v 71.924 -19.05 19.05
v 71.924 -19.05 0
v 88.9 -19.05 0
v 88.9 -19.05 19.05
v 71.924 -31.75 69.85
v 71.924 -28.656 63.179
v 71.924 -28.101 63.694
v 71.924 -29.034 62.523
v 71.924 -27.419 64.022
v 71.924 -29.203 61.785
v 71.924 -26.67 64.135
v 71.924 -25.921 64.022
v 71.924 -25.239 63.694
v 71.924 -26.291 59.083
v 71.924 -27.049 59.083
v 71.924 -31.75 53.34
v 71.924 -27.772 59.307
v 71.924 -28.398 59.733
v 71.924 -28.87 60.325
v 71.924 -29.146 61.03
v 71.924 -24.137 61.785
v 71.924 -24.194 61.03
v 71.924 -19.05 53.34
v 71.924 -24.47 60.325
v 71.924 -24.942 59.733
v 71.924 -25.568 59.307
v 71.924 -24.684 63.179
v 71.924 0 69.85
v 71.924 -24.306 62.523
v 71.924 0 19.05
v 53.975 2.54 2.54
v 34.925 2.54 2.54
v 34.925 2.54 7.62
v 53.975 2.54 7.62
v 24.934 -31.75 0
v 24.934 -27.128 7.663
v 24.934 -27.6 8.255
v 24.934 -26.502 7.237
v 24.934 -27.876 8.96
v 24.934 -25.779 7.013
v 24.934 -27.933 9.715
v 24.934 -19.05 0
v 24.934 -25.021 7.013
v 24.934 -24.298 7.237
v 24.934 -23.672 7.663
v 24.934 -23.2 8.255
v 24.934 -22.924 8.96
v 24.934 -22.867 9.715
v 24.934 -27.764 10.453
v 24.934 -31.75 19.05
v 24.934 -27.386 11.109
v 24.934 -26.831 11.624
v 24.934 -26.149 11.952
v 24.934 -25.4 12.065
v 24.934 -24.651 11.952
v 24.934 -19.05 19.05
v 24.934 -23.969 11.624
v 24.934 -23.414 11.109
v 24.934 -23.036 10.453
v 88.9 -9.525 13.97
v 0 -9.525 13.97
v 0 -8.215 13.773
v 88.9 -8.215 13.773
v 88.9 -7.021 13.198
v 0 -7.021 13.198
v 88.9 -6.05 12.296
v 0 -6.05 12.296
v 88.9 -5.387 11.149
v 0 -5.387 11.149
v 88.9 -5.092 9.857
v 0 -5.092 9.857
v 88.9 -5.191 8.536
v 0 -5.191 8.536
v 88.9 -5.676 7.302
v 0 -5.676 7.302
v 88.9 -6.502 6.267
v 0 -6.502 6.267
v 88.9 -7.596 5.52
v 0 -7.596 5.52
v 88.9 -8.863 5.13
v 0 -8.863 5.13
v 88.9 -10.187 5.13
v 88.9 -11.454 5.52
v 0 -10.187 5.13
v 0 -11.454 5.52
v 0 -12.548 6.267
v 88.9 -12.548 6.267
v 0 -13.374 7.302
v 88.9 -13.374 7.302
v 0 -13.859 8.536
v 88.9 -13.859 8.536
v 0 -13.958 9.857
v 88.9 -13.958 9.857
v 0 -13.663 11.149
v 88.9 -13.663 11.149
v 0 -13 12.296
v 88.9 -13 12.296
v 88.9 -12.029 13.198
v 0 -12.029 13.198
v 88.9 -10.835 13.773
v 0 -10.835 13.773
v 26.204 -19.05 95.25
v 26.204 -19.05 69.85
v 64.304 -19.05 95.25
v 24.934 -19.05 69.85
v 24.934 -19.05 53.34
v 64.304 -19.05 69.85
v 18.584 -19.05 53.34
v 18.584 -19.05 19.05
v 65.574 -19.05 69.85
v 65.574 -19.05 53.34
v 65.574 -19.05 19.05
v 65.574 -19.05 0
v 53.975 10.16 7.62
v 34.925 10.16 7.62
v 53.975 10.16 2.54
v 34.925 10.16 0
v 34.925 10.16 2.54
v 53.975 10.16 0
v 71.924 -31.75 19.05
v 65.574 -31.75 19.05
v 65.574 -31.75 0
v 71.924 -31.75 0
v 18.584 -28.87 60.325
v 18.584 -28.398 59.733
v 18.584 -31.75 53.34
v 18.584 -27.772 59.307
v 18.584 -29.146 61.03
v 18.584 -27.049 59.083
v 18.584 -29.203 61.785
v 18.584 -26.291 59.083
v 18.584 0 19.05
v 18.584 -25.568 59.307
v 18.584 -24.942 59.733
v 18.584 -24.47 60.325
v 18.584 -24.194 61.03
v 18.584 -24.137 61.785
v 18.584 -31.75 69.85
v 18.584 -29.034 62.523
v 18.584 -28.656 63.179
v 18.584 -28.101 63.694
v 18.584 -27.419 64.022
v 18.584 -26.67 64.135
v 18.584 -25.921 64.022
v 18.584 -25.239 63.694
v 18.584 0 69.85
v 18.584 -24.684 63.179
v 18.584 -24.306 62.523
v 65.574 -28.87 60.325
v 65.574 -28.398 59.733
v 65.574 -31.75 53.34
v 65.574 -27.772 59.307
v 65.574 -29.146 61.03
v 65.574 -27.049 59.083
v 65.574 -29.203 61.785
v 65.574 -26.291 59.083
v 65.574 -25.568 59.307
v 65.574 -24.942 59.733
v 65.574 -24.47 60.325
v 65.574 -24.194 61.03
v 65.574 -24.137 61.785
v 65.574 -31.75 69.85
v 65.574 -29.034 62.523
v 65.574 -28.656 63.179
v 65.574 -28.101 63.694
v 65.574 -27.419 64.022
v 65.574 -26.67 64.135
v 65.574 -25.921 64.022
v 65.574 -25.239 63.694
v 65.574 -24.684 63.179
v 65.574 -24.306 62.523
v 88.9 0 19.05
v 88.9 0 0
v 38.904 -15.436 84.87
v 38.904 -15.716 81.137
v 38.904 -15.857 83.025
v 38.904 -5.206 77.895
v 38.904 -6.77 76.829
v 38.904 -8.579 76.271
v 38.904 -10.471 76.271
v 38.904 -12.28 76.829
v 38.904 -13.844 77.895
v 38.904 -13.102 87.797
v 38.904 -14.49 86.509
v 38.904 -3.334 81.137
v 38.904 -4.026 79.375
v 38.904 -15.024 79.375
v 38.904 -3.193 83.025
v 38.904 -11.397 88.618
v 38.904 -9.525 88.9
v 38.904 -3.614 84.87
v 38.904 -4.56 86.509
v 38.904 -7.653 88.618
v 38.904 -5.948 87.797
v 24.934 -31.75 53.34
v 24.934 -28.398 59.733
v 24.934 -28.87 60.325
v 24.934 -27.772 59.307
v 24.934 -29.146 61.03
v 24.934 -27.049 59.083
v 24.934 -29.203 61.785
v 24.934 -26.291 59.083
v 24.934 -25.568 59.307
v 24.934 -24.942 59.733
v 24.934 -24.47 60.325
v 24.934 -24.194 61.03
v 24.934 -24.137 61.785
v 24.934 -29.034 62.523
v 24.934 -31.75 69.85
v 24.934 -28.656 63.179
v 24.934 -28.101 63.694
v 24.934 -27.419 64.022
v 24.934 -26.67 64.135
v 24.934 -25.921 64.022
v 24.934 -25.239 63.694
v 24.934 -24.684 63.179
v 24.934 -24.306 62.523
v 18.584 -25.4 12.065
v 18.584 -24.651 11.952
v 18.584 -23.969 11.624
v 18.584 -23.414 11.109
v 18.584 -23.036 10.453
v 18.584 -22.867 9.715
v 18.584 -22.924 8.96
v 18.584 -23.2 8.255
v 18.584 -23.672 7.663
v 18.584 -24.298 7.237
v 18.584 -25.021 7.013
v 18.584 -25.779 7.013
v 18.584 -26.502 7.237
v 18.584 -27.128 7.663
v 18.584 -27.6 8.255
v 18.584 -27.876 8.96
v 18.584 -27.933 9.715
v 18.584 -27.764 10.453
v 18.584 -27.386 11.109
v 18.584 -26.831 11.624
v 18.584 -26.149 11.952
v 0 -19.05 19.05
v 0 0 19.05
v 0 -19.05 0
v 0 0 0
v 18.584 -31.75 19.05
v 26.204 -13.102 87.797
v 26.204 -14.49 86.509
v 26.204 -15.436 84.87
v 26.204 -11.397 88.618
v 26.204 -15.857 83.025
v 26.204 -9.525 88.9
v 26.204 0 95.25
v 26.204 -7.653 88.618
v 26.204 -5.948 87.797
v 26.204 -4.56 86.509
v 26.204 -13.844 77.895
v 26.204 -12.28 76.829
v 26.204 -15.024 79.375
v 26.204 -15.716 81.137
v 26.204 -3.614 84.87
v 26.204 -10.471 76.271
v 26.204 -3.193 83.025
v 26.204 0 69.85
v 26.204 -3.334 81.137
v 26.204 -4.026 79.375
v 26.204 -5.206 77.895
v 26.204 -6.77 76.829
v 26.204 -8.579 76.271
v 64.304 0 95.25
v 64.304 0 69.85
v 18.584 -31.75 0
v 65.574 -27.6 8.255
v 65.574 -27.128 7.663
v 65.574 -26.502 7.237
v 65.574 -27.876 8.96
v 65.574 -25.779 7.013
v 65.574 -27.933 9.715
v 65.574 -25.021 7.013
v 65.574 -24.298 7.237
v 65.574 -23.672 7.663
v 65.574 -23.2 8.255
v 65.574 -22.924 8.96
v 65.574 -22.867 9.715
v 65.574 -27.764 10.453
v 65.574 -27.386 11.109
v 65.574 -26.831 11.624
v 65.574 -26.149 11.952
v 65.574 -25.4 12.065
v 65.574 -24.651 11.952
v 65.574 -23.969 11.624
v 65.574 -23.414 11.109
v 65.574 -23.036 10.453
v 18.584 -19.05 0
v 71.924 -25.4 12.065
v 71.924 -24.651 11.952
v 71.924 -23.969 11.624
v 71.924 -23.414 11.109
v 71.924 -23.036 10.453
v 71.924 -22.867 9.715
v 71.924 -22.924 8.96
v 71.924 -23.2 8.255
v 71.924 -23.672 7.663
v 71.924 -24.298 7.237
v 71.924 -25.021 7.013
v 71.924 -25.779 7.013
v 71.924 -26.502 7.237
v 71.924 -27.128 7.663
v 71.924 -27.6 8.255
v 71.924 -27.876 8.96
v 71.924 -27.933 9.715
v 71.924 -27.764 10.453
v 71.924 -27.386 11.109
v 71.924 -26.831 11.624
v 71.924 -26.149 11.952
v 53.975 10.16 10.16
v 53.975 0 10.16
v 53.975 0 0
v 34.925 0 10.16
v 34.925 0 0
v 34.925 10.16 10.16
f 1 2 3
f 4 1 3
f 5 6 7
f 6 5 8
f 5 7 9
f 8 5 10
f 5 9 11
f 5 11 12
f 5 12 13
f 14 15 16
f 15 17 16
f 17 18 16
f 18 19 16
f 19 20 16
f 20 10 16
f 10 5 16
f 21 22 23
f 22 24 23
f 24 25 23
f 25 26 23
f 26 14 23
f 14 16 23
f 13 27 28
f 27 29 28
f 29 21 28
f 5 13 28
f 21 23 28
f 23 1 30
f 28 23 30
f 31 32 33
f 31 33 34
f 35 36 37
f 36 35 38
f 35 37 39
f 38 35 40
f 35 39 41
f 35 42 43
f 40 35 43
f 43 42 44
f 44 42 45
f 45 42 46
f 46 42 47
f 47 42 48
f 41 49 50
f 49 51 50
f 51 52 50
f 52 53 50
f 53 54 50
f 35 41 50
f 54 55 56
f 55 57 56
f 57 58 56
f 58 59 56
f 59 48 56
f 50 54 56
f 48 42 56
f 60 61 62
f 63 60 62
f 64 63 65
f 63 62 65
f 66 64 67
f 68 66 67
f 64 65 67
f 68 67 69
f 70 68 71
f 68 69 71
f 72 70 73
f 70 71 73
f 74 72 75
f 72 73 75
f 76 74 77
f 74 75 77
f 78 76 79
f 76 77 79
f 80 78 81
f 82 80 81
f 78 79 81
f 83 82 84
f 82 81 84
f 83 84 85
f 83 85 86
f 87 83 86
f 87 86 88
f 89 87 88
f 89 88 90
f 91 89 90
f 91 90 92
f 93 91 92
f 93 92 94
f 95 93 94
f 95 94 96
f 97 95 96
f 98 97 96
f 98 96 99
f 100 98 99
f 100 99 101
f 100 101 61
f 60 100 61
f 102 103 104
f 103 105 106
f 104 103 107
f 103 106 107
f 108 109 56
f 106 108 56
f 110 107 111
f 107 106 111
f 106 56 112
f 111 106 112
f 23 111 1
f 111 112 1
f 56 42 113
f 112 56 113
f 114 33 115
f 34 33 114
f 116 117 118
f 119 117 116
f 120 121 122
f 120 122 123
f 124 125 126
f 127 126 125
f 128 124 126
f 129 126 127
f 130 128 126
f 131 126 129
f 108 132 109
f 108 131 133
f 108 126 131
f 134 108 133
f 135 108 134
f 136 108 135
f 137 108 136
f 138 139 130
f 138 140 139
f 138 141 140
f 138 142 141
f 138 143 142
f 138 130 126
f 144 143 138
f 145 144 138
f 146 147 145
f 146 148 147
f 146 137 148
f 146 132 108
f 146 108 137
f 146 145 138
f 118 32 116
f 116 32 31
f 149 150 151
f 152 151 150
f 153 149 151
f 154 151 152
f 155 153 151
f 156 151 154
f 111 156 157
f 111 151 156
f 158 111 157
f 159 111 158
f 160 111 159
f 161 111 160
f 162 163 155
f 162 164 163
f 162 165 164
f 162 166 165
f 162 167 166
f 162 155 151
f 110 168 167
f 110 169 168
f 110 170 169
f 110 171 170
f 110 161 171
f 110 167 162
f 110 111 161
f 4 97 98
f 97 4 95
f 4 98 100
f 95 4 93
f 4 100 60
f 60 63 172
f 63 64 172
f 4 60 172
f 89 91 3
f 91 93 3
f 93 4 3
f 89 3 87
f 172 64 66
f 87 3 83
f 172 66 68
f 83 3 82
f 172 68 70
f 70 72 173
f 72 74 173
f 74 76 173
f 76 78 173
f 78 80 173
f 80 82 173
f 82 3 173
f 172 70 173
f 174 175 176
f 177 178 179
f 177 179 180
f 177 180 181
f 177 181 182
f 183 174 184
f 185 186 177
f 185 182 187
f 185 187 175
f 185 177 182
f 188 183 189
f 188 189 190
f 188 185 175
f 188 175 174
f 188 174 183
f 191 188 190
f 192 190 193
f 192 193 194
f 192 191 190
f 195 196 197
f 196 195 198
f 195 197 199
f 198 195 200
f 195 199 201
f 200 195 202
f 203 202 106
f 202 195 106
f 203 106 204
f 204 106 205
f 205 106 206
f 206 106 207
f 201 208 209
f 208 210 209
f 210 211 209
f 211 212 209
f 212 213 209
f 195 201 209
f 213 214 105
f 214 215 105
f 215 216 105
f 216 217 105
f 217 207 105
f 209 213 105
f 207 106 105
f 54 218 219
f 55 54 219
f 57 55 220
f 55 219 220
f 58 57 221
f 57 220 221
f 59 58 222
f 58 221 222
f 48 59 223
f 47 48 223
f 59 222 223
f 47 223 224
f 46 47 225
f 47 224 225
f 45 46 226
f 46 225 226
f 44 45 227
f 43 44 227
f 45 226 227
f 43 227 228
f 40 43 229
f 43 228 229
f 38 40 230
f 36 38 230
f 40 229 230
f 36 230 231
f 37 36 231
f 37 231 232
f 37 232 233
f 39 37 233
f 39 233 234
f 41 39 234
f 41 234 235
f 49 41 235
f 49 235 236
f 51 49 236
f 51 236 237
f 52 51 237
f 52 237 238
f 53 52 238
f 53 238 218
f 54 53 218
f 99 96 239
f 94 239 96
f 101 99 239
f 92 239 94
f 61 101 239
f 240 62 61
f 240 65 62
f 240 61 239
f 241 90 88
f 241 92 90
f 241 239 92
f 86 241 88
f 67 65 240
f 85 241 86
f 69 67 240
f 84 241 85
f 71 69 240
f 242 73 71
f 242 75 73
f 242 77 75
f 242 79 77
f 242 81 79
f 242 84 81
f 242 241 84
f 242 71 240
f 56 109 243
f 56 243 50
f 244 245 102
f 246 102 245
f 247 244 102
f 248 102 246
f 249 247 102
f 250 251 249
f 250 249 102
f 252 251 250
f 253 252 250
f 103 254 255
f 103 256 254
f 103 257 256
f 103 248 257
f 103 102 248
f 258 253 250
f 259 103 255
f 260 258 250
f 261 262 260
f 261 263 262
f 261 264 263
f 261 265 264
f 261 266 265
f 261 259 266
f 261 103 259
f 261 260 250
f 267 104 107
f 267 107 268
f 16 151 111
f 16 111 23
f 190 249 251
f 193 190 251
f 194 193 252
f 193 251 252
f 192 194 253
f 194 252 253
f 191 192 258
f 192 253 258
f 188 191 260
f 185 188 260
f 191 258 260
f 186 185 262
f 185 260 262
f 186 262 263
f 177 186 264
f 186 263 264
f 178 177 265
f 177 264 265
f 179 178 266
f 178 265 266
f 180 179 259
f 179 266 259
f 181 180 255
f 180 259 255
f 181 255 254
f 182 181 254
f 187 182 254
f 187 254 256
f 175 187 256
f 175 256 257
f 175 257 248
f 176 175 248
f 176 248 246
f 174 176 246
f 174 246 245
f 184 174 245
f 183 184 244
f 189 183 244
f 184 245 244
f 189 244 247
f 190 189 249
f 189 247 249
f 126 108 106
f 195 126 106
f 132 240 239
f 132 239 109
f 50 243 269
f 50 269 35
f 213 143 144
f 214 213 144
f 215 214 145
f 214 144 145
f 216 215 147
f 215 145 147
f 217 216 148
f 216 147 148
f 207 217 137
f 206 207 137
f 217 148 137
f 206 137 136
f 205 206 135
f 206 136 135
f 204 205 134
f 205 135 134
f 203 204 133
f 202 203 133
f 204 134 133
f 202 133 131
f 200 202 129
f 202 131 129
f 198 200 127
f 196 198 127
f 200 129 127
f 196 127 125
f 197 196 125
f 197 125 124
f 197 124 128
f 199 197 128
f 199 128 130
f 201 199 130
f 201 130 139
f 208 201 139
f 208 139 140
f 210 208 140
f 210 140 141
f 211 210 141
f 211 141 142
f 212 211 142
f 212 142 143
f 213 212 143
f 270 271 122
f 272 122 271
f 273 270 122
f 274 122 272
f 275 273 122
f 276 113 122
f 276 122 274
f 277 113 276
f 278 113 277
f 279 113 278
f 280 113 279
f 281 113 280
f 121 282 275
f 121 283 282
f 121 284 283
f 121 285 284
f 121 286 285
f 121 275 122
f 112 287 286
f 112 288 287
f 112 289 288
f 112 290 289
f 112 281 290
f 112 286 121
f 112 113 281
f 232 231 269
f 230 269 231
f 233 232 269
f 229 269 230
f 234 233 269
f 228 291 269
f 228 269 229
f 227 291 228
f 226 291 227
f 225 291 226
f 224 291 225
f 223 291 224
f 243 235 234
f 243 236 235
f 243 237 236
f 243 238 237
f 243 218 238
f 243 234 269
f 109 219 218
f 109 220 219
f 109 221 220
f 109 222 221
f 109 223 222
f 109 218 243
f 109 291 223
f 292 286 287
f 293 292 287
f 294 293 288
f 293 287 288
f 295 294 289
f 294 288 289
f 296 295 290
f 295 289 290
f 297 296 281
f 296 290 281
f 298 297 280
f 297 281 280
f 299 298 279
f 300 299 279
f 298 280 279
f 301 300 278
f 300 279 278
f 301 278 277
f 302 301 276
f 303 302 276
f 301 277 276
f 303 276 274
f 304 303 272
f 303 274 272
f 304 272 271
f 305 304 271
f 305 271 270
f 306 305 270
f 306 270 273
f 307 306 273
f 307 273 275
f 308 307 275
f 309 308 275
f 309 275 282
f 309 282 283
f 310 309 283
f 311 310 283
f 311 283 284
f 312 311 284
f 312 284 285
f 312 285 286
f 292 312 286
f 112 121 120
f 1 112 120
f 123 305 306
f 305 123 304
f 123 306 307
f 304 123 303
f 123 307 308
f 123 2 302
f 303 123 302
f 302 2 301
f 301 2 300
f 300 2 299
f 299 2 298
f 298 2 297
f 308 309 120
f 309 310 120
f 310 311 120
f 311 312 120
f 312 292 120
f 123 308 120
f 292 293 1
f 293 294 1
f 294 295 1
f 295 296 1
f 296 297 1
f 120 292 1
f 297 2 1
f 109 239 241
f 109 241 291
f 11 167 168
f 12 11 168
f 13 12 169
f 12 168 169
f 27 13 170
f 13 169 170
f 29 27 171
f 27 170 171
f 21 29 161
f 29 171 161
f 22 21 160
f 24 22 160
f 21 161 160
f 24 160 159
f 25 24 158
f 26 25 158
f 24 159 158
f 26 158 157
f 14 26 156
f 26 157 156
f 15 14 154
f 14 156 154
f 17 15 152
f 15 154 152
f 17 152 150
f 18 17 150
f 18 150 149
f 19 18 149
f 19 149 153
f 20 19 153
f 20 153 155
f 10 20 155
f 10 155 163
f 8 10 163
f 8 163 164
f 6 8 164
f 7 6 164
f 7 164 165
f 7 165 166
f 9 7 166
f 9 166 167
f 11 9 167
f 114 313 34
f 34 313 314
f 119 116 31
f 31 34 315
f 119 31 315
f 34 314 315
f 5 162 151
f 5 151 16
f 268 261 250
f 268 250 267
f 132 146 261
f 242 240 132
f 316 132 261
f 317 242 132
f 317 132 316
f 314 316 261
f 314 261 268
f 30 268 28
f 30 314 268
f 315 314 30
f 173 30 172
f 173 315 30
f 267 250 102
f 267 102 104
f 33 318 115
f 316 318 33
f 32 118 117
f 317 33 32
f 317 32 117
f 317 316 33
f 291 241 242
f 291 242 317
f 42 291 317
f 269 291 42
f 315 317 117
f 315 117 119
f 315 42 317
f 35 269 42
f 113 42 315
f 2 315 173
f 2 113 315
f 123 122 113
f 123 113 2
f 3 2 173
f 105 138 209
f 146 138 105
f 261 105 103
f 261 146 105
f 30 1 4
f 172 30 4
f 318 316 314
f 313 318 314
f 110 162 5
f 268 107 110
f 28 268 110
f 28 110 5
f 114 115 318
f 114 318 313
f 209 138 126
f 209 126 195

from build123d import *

# Parameters (mm, degrees)
SKETCH1_W           = 88.9
SKETCH1_H           = 19.05
BOSS_EXTRUDE1_DEPTH = 19.05
SKETCH2_W           = 6.35
SKETCH2_H           = 19.05
BOSS_EXTRUDE2_DEPTH = 12.7
SKETCH3_R           = 4.445
CUT_EXTRUDE1_DEPTH  = 96.266
SKETCH4_R           = 2.54
CUT_EXTRUDE2_DEPTH  = 96.266
SKETCH5_W           = 53.34
SKETCH5_H           = 19.05
BOSS_EXTRUDE3_DEPTH = 50.8
SKETCH6_W           = 6.35
SKETCH6_H           = 16.51
BOSS_EXTRUDE4_DEPTH = 12.7
SKETCH7_R           = 2.54
CUT_EXTRUDE3_DEPTH  = 61.976
SKETCH8_W           = 19.05
SKETCH8_H           = 10.16
BOSS_EXTRUDE5_DEPTH = 2.54
SKETCH9_W           = 19.05
SKETCH9_H           = 2.54
BOSS_EXTRUDE6_DEPTH = 7.62
SKETCH10_W          = 38.1
SKETCH10_H          = 19.05
BOSS_EXTRUDE7_DEPTH = 25.4
SKETCH11_R          = 6.35
CUT_EXTRUDE4_DEPTH  = 12.7


with BuildPart() as part:
    # Sketch1 → Boss-Extrude1 (new body)
    with BuildSketch(Plane.XY):
        with Locations((44.45, -9.525)):
            Rectangle(SKETCH1_W, SKETCH1_H)
    extrude(amount=BOSS_EXTRUDE1_DEPTH)

    # Sketch2 → Boss-Extrude2 (add)
    with BuildSketch(Plane.XZ.offset(19.05)):
        with Locations((21.758870797, 9.525)):
            Rectangle(SKETCH2_W, SKETCH2_H)
        with Locations((68.748870797, 9.525)):
            Rectangle(SKETCH2_W, SKETCH2_H)
    extrude(amount=BOSS_EXTRUDE2_DEPTH)

    # Sketch3 → Cut-Extrude1 (cut)
    with BuildSketch(Plane.ZY):
        with Locations((9.525, -9.525)):
            Circle(SKETCH3_R)
    extrude(amount=-CUT_EXTRUDE1_DEPTH, mode=Mode.SUBTRACT)

    # Sketch4 → Cut-Extrude2 (cut)
    with BuildSketch(Plane.ZY.offset(-18.583870797)):
        with Locations((9.525, -25.4)):
            Circle(SKETCH4_R)
    extrude(amount=-CUT_EXTRUDE2_DEPTH, mode=Mode.SUBTRACT)

    # Sketch5 → Boss-Extrude3 (add)
    with BuildSketch(Plane.XY.offset(19.05)):
        with Locations((45.253870797, -9.525)):
            Rectangle(SKETCH5_W, SKETCH5_H)
    extrude(amount=BOSS_EXTRUDE3_DEPTH)

    # Sketch6 → Boss-Extrude4 (add)
    with BuildSketch(Plane.XZ.offset(19.05)):
        with Locations((21.758870797, 61.595)):
            Rectangle(SKETCH6_W, SKETCH6_H)
        with Locations((68.748870797, 61.595)):
            Rectangle(SKETCH6_W, SKETCH6_H)
    extrude(amount=BOSS_EXTRUDE4_DEPTH)

    # Sketch7 → Cut-Extrude3 (cut)
    with BuildSketch(Plane.ZY.offset(-18.583870797)):
        with Locations((61.595, -26.67)):
            Circle(SKETCH7_R)
    extrude(amount=-CUT_EXTRUDE3_DEPTH, mode=Mode.SUBTRACT)

    # Sketch8 → Boss-Extrude5 (add)
    with BuildSketch(Plane(origin=(0, 0, 0), x_dir=(1, 0, 0), z_dir=(0, 1, 0))):
        with Locations((44.45, -5.08)):
            Rectangle(SKETCH8_W, SKETCH8_H)
    extrude(amount=BOSS_EXTRUDE5_DEPTH)

    # Sketch9 → Boss-Extrude6 (add)
    with BuildSketch(Plane(origin=(0, 2.54, 0), x_dir=(1, 0, 0), z_dir=(0, 1, 0))):
        with Locations((44.45, -1.27)):
            Rectangle(SKETCH9_W, SKETCH9_H)
        with Locations((44.45, -8.89)):
            Rectangle(SKETCH9_W, SKETCH9_H)
    extrude(amount=BOSS_EXTRUDE6_DEPTH)

    # Sketch10 → Boss-Extrude7 (add)
    with BuildSketch(Plane.XY.offset(69.85)):
        with Locations((45.253870797, -9.525)):
            Rectangle(SKETCH10_W, SKETCH10_H)
    extrude(amount=BOSS_EXTRUDE7_DEPTH)

    # Sketch11 → Cut-Extrude4 (cut)
    with BuildSketch(Plane.ZY.offset(-26.203870797)):
        with Locations((82.55, -9.525)):
            Circle(SKETCH11_R)
    extrude(amount=-CUT_EXTRUDE4_DEPTH, mode=Mode.SUBTRACT)


solid = part.part
